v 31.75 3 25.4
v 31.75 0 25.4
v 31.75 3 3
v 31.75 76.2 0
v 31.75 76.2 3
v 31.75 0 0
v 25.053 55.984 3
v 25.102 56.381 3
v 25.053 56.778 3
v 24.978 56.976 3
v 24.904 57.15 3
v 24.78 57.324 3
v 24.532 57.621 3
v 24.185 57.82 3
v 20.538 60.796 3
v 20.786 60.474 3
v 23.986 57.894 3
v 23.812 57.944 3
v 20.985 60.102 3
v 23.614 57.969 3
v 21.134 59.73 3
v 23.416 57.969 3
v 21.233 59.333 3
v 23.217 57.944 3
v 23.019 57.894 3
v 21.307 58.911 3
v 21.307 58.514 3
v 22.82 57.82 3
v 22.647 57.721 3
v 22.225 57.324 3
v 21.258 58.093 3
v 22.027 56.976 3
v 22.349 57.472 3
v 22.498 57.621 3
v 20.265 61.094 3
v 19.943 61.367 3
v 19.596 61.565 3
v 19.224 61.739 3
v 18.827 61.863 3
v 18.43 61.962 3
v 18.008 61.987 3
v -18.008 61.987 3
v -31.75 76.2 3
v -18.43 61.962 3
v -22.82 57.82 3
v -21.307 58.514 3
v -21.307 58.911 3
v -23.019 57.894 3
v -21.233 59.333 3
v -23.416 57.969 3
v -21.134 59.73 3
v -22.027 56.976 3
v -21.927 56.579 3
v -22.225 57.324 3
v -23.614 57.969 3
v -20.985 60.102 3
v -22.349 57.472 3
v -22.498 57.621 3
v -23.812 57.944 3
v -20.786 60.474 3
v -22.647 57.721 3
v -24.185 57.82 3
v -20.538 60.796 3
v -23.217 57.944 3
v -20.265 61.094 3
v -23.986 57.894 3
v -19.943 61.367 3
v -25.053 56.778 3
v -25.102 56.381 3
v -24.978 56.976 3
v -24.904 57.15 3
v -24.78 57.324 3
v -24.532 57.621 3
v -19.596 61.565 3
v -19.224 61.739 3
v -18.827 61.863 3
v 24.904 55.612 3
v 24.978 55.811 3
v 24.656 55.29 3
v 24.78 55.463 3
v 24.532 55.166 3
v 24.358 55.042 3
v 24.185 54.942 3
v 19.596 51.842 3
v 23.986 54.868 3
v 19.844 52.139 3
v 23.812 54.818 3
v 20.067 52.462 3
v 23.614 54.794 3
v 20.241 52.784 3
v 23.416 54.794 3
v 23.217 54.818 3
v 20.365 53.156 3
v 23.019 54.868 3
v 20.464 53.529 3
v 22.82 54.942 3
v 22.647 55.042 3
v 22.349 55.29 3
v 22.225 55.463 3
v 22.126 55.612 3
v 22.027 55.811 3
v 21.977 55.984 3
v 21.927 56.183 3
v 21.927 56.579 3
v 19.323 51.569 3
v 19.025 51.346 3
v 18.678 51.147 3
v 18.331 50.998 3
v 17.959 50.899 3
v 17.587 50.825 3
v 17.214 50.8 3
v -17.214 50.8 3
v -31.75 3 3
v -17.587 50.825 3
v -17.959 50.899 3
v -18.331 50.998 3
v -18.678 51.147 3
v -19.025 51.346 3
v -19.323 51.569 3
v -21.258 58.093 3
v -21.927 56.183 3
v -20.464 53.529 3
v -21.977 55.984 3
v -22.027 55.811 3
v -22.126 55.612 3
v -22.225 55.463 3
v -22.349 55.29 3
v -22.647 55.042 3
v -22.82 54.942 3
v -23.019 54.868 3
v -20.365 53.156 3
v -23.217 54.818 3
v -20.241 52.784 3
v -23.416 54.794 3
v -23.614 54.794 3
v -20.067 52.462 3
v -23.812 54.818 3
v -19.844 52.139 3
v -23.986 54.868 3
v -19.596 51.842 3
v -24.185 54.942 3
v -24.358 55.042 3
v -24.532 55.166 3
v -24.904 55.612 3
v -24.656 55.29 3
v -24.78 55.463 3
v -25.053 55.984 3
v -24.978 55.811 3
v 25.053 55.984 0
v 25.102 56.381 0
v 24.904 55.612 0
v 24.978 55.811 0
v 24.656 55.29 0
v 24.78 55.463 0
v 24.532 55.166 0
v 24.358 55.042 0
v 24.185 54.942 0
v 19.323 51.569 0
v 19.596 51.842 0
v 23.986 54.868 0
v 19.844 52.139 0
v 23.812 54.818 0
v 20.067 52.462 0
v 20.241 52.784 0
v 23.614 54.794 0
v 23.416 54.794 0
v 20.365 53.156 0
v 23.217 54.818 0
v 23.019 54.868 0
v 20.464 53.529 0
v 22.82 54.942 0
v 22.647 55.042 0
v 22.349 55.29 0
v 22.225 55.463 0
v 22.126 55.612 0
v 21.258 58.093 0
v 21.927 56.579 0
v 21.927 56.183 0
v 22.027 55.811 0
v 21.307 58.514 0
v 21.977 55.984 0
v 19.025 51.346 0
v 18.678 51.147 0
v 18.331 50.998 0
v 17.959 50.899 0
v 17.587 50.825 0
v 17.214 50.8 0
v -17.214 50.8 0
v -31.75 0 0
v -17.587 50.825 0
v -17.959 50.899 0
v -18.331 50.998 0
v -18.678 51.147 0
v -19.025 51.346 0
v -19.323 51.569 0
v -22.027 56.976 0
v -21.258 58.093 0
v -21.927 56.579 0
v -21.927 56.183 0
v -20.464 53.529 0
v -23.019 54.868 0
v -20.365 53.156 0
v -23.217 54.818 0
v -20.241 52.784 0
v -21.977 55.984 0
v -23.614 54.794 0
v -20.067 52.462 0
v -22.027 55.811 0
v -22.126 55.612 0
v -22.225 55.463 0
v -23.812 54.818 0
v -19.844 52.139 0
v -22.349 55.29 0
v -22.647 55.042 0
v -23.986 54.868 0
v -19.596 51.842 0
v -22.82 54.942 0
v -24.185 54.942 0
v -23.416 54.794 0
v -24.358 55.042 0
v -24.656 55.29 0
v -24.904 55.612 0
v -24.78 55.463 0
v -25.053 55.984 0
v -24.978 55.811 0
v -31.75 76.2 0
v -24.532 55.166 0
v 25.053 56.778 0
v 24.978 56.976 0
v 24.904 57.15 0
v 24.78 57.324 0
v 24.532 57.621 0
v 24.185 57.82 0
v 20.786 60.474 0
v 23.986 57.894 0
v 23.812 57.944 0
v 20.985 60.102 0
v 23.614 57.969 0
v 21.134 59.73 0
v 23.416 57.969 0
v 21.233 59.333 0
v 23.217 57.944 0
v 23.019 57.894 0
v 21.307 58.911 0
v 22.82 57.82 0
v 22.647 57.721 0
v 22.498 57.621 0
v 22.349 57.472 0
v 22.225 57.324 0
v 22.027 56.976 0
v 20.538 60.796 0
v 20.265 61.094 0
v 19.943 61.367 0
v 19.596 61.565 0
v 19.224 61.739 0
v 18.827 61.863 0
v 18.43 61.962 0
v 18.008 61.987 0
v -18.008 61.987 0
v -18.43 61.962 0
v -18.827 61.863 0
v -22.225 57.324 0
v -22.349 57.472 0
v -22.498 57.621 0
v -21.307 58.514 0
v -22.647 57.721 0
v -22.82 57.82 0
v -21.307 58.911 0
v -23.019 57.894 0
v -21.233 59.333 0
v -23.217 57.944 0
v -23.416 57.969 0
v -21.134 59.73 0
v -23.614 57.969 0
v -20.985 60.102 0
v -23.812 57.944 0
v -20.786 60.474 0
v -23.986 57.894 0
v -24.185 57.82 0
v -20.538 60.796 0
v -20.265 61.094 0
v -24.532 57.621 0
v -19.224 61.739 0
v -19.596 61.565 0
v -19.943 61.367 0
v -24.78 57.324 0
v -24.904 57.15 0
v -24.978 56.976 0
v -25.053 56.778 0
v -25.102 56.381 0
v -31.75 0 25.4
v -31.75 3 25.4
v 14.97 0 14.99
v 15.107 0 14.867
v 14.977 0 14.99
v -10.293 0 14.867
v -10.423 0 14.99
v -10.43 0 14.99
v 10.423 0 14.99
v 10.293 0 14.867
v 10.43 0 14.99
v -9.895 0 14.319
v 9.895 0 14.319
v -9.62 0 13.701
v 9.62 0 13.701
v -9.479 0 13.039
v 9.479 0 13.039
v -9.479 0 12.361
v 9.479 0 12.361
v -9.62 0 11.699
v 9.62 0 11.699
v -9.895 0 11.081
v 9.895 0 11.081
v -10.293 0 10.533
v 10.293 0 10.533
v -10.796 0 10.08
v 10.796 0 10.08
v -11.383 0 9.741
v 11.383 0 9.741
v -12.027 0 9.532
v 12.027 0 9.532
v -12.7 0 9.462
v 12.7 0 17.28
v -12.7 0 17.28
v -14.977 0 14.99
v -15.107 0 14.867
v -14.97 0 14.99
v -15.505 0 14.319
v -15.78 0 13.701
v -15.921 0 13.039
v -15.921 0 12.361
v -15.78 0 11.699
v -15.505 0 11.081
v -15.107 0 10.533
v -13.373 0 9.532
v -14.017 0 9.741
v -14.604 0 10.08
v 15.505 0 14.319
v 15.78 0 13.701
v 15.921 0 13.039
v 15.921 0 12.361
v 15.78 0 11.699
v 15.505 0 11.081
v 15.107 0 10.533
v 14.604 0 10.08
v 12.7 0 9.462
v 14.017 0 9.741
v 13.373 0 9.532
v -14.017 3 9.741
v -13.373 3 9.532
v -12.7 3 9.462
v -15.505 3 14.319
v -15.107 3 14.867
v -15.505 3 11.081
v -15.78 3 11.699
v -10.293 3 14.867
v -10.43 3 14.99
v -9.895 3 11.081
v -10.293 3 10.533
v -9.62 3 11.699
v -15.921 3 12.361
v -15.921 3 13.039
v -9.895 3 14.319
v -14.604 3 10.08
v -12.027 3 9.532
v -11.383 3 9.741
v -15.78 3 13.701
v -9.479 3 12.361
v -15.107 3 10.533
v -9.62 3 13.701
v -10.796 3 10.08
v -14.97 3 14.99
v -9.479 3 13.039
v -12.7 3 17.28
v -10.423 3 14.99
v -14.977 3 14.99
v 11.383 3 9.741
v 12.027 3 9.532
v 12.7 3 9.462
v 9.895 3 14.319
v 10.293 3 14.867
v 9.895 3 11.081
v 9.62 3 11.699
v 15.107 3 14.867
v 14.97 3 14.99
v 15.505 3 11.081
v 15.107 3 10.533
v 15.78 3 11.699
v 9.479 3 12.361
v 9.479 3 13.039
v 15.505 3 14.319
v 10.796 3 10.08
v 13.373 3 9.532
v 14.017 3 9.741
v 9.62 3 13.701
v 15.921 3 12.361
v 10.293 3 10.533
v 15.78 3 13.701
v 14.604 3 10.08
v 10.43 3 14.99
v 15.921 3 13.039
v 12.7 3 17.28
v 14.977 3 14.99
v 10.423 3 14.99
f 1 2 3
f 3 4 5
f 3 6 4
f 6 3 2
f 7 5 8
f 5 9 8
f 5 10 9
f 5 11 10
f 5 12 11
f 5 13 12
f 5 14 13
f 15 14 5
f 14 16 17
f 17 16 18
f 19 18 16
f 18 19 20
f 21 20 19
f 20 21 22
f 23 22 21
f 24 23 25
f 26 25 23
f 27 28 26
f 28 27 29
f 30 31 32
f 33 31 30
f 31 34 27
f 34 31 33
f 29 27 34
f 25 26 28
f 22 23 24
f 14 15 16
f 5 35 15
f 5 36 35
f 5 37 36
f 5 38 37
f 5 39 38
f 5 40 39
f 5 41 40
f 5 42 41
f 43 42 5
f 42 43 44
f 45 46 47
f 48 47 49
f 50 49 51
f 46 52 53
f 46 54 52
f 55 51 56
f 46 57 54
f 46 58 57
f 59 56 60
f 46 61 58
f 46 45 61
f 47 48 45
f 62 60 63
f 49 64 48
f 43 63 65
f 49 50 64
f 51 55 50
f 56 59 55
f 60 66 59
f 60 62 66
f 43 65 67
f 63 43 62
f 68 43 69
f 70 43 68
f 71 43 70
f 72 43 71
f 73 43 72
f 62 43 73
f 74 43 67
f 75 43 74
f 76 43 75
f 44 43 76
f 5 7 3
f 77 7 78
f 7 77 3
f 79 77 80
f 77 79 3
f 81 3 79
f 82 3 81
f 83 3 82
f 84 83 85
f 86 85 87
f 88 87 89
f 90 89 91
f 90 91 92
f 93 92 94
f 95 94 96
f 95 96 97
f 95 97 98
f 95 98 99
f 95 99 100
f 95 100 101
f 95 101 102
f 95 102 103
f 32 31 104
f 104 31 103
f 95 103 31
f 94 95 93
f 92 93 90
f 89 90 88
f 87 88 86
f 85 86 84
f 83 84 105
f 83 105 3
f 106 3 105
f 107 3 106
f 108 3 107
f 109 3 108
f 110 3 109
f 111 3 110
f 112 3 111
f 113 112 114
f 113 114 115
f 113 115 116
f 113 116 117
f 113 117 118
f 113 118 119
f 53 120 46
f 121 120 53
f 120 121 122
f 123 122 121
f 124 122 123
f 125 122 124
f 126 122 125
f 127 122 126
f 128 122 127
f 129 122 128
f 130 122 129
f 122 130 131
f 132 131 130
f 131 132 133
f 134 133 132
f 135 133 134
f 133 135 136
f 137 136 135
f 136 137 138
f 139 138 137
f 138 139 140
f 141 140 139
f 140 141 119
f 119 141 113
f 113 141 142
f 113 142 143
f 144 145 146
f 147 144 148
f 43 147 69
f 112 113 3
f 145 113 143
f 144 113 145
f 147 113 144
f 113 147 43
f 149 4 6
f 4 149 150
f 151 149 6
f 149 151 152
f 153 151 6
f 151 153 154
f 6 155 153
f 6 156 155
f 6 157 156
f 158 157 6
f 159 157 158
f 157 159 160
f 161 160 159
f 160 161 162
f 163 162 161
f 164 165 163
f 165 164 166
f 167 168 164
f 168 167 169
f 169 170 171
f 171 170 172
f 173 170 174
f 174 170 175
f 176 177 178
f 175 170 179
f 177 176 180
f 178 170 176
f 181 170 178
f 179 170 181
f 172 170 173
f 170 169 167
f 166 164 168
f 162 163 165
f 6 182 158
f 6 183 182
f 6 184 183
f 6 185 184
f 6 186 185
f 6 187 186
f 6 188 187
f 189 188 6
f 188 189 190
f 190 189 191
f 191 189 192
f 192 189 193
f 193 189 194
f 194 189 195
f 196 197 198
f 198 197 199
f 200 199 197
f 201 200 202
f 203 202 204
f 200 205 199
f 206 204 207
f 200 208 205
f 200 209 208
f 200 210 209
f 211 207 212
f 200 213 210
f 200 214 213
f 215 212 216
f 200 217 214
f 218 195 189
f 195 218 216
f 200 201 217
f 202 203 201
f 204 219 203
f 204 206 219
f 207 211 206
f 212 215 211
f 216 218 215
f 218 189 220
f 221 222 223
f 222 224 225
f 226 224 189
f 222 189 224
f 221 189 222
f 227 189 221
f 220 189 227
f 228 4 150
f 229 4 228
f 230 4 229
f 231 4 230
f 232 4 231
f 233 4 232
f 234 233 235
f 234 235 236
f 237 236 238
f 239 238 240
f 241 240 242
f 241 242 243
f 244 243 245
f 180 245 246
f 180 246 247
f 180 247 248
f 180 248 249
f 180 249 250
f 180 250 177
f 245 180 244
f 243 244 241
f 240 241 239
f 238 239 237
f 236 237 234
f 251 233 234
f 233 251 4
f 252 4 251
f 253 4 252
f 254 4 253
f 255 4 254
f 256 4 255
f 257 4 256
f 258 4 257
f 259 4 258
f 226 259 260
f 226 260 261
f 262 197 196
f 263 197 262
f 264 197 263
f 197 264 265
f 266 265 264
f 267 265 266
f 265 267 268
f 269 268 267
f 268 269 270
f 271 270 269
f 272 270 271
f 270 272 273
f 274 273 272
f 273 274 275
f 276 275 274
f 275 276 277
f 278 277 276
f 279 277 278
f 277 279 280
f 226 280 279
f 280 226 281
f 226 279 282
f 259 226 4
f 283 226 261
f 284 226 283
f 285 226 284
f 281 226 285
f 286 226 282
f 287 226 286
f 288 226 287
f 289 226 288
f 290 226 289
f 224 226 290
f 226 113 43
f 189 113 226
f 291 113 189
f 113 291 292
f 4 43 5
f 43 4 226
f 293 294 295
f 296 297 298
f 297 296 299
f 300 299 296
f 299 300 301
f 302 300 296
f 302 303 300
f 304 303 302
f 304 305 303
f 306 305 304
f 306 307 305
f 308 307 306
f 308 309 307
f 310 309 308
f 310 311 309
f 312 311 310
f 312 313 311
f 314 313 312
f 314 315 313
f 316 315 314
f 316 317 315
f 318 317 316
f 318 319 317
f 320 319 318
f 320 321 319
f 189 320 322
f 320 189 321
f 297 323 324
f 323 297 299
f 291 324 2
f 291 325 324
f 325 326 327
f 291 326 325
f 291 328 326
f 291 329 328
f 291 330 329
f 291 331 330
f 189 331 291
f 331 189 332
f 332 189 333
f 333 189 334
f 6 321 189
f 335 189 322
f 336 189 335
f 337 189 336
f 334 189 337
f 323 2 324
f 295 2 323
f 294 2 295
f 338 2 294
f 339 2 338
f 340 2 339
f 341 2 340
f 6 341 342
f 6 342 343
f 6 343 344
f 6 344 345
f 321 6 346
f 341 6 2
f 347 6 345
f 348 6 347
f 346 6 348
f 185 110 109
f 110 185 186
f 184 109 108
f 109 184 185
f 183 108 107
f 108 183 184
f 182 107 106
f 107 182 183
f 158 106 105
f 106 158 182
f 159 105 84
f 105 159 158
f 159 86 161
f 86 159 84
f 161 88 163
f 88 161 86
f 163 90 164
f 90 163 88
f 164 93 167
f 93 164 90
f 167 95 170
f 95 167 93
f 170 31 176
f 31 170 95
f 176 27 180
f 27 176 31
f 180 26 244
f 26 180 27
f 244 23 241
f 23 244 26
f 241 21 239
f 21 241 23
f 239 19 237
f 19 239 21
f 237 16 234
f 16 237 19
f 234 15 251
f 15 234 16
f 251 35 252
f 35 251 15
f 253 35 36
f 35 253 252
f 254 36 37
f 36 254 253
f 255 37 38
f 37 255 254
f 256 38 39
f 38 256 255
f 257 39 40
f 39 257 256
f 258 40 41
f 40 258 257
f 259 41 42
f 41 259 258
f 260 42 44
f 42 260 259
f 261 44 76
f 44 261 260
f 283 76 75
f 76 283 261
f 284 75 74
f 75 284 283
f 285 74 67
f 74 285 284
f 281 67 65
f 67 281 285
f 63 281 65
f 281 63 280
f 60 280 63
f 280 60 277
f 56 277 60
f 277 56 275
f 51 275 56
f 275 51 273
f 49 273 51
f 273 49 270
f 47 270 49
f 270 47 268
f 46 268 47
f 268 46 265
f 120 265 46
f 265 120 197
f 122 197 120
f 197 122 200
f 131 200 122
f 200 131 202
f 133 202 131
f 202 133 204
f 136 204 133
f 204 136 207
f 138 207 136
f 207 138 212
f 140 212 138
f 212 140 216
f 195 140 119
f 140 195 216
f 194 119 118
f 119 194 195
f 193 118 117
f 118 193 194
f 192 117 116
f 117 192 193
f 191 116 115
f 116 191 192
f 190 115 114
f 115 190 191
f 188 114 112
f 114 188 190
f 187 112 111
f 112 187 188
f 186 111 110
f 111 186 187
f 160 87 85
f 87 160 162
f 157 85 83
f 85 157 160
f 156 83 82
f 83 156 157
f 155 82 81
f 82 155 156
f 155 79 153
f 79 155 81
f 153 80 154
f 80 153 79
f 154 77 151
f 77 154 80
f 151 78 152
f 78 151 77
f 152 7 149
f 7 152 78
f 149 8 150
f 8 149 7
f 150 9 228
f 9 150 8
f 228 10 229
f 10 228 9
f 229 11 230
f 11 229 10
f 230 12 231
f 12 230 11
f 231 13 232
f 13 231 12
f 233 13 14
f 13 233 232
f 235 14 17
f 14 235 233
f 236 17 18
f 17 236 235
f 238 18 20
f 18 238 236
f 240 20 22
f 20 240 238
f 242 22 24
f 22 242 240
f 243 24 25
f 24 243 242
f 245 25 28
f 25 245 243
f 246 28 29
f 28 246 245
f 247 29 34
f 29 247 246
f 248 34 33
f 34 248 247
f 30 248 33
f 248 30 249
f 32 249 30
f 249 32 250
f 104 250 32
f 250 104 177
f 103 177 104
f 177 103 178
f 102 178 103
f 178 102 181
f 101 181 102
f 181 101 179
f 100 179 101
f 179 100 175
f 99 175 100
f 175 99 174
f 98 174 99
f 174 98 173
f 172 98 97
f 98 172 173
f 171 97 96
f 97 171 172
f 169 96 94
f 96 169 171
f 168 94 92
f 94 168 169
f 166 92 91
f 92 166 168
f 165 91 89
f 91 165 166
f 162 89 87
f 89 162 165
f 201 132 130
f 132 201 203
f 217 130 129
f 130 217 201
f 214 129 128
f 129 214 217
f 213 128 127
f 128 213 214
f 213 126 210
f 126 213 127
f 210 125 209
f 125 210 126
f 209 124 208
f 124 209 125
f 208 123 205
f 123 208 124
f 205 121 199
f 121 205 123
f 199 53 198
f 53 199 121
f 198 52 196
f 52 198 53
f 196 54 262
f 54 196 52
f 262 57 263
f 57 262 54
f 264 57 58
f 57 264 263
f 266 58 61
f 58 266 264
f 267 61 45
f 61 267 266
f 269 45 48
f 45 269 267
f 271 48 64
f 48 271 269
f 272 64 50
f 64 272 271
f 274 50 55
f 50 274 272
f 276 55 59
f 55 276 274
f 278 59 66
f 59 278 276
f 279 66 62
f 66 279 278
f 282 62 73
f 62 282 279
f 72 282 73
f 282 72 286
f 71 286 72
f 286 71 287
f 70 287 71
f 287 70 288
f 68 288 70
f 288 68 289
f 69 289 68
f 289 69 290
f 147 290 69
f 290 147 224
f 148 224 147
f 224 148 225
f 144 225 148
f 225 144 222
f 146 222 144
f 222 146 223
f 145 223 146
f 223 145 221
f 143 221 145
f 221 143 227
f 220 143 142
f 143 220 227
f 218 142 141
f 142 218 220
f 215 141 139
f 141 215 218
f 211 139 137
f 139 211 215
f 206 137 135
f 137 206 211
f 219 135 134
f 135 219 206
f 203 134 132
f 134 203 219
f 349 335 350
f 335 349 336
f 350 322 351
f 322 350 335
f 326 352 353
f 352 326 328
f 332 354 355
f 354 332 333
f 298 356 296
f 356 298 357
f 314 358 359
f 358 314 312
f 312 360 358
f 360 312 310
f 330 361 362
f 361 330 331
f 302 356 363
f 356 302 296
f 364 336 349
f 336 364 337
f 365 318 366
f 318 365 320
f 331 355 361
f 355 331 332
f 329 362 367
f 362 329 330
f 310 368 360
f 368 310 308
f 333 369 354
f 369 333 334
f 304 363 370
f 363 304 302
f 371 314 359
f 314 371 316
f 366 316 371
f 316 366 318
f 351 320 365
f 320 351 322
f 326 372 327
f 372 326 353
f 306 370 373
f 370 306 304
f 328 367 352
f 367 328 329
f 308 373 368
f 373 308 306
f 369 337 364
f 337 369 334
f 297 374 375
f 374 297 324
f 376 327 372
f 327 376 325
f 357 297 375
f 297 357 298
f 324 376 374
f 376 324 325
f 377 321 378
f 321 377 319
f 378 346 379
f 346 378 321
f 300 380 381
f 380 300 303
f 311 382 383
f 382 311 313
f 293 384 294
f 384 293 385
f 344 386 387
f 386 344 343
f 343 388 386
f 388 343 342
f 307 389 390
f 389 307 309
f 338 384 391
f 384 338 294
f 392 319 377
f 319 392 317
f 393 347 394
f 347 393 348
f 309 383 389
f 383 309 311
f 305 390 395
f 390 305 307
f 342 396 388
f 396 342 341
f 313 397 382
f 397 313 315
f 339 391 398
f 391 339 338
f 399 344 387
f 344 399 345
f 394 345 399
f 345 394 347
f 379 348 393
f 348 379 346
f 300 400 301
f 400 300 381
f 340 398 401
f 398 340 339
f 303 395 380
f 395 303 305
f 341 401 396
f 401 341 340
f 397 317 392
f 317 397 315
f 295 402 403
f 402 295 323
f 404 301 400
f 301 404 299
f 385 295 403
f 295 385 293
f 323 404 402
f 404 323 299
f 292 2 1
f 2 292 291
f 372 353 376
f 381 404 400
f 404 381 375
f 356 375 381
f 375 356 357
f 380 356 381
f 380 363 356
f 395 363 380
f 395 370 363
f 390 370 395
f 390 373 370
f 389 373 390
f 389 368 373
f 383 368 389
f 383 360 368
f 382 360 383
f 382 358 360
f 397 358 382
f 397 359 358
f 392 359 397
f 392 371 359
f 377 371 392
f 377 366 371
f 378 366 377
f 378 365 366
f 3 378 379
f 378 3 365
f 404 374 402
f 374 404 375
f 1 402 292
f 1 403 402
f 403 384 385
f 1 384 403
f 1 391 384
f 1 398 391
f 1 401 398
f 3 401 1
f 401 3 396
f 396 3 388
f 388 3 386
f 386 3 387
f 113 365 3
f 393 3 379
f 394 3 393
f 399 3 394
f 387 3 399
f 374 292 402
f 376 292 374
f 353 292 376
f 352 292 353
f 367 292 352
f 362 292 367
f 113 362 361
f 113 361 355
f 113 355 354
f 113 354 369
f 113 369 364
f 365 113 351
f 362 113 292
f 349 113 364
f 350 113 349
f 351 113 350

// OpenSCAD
use <MCAD/teardrop.scad>

$fn=50;
inch = 25.4;
width = 2.5*inch;

difference() {
  
  translate([-width/2, 0, 0])
  cube([width, 3*inch, 3]);
    
union(){
  translate([0, 2*inch, 0])
    linear_extrude(5)
      scale([inch, inch, 0])
        import("./DB25.dxf");
}

}

module myhole() {
  rotate([0, 0, 90]) {
    teardrop(radius=0.255*inch/2, length=20, angle=90);
  }
}

difference() {

translate([-width/2, 0, 0]) 
cube([width, 3, 1*inch]);

union() {
   
translate([-0.5*inch, 0, 0.5*inch])
myhole();

translate([0.5*inch, 0, 0.5*inch])
myhole();

}
}
